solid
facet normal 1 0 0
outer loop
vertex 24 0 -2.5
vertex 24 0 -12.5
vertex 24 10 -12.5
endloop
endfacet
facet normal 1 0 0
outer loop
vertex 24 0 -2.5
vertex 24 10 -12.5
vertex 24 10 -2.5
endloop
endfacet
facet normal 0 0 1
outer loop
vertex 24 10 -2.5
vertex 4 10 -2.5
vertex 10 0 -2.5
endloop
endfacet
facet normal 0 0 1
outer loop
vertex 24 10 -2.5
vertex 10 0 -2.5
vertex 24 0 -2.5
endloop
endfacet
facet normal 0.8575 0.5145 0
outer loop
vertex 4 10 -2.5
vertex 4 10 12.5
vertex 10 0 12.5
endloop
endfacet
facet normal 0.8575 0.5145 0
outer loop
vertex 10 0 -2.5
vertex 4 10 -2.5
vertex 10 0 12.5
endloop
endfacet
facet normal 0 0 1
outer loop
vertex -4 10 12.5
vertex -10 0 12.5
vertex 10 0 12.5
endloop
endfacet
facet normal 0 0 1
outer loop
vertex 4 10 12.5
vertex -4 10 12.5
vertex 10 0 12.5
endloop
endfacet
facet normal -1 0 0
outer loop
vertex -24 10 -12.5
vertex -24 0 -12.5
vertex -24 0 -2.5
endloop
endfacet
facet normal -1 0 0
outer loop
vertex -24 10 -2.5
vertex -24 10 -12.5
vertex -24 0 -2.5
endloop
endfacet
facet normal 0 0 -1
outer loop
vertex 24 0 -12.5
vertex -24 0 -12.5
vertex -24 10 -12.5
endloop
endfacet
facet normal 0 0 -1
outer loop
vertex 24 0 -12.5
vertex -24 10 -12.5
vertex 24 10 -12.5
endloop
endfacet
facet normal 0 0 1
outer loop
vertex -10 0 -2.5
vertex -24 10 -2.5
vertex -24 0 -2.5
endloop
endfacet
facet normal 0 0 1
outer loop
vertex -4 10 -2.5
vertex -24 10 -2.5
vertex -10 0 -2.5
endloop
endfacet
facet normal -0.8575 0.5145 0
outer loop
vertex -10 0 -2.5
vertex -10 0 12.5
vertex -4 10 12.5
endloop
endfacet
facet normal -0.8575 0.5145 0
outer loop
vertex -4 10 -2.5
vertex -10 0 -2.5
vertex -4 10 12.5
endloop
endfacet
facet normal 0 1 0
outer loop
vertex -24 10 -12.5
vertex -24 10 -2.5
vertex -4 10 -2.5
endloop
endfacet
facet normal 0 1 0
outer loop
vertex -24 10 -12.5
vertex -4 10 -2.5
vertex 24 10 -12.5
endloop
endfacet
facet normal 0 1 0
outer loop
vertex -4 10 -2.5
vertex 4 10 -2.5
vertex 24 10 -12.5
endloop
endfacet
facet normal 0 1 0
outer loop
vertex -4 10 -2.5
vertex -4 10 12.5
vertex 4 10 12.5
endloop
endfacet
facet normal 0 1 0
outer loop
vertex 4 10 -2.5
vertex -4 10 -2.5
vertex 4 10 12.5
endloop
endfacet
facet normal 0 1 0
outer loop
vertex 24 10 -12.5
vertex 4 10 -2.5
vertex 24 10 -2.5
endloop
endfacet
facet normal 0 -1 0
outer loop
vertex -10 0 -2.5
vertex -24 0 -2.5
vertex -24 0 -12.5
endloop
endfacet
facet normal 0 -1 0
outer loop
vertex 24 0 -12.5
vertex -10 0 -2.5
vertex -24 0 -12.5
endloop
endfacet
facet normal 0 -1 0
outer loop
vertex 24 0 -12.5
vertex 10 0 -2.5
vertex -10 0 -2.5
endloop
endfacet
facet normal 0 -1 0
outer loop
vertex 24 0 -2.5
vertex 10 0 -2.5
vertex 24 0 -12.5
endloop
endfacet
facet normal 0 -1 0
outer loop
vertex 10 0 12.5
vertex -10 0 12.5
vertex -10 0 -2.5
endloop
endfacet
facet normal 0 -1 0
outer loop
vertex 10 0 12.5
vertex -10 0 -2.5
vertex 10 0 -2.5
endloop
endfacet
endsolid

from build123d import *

# Parameters (mm, degrees)
F0_W     = 48
F0_H     = 25
F1_DEPTH = 10
F3_DEPTH = 15


with BuildPart() as f1:
    # F0 (on Front) → F1 (new body)
    with BuildSketch(Plane.XZ):
        Rectangle(F0_W, F0_H)
    extrude(amount=-F1_DEPTH)

    # F2 (on face) → F3 (cut)
    with BuildSketch(Plane.XY.offset(12.5)):
        Polygon((-24, 0), (-10, 0), (-4, 10), (-24, 10), align=None)
        Polygon((4, 10), (10, 0), (24, 0), (24, 10), align=None)
    extrude(amount=-F3_DEPTH, mode=Mode.SUBTRACT)


solid = f1.part
